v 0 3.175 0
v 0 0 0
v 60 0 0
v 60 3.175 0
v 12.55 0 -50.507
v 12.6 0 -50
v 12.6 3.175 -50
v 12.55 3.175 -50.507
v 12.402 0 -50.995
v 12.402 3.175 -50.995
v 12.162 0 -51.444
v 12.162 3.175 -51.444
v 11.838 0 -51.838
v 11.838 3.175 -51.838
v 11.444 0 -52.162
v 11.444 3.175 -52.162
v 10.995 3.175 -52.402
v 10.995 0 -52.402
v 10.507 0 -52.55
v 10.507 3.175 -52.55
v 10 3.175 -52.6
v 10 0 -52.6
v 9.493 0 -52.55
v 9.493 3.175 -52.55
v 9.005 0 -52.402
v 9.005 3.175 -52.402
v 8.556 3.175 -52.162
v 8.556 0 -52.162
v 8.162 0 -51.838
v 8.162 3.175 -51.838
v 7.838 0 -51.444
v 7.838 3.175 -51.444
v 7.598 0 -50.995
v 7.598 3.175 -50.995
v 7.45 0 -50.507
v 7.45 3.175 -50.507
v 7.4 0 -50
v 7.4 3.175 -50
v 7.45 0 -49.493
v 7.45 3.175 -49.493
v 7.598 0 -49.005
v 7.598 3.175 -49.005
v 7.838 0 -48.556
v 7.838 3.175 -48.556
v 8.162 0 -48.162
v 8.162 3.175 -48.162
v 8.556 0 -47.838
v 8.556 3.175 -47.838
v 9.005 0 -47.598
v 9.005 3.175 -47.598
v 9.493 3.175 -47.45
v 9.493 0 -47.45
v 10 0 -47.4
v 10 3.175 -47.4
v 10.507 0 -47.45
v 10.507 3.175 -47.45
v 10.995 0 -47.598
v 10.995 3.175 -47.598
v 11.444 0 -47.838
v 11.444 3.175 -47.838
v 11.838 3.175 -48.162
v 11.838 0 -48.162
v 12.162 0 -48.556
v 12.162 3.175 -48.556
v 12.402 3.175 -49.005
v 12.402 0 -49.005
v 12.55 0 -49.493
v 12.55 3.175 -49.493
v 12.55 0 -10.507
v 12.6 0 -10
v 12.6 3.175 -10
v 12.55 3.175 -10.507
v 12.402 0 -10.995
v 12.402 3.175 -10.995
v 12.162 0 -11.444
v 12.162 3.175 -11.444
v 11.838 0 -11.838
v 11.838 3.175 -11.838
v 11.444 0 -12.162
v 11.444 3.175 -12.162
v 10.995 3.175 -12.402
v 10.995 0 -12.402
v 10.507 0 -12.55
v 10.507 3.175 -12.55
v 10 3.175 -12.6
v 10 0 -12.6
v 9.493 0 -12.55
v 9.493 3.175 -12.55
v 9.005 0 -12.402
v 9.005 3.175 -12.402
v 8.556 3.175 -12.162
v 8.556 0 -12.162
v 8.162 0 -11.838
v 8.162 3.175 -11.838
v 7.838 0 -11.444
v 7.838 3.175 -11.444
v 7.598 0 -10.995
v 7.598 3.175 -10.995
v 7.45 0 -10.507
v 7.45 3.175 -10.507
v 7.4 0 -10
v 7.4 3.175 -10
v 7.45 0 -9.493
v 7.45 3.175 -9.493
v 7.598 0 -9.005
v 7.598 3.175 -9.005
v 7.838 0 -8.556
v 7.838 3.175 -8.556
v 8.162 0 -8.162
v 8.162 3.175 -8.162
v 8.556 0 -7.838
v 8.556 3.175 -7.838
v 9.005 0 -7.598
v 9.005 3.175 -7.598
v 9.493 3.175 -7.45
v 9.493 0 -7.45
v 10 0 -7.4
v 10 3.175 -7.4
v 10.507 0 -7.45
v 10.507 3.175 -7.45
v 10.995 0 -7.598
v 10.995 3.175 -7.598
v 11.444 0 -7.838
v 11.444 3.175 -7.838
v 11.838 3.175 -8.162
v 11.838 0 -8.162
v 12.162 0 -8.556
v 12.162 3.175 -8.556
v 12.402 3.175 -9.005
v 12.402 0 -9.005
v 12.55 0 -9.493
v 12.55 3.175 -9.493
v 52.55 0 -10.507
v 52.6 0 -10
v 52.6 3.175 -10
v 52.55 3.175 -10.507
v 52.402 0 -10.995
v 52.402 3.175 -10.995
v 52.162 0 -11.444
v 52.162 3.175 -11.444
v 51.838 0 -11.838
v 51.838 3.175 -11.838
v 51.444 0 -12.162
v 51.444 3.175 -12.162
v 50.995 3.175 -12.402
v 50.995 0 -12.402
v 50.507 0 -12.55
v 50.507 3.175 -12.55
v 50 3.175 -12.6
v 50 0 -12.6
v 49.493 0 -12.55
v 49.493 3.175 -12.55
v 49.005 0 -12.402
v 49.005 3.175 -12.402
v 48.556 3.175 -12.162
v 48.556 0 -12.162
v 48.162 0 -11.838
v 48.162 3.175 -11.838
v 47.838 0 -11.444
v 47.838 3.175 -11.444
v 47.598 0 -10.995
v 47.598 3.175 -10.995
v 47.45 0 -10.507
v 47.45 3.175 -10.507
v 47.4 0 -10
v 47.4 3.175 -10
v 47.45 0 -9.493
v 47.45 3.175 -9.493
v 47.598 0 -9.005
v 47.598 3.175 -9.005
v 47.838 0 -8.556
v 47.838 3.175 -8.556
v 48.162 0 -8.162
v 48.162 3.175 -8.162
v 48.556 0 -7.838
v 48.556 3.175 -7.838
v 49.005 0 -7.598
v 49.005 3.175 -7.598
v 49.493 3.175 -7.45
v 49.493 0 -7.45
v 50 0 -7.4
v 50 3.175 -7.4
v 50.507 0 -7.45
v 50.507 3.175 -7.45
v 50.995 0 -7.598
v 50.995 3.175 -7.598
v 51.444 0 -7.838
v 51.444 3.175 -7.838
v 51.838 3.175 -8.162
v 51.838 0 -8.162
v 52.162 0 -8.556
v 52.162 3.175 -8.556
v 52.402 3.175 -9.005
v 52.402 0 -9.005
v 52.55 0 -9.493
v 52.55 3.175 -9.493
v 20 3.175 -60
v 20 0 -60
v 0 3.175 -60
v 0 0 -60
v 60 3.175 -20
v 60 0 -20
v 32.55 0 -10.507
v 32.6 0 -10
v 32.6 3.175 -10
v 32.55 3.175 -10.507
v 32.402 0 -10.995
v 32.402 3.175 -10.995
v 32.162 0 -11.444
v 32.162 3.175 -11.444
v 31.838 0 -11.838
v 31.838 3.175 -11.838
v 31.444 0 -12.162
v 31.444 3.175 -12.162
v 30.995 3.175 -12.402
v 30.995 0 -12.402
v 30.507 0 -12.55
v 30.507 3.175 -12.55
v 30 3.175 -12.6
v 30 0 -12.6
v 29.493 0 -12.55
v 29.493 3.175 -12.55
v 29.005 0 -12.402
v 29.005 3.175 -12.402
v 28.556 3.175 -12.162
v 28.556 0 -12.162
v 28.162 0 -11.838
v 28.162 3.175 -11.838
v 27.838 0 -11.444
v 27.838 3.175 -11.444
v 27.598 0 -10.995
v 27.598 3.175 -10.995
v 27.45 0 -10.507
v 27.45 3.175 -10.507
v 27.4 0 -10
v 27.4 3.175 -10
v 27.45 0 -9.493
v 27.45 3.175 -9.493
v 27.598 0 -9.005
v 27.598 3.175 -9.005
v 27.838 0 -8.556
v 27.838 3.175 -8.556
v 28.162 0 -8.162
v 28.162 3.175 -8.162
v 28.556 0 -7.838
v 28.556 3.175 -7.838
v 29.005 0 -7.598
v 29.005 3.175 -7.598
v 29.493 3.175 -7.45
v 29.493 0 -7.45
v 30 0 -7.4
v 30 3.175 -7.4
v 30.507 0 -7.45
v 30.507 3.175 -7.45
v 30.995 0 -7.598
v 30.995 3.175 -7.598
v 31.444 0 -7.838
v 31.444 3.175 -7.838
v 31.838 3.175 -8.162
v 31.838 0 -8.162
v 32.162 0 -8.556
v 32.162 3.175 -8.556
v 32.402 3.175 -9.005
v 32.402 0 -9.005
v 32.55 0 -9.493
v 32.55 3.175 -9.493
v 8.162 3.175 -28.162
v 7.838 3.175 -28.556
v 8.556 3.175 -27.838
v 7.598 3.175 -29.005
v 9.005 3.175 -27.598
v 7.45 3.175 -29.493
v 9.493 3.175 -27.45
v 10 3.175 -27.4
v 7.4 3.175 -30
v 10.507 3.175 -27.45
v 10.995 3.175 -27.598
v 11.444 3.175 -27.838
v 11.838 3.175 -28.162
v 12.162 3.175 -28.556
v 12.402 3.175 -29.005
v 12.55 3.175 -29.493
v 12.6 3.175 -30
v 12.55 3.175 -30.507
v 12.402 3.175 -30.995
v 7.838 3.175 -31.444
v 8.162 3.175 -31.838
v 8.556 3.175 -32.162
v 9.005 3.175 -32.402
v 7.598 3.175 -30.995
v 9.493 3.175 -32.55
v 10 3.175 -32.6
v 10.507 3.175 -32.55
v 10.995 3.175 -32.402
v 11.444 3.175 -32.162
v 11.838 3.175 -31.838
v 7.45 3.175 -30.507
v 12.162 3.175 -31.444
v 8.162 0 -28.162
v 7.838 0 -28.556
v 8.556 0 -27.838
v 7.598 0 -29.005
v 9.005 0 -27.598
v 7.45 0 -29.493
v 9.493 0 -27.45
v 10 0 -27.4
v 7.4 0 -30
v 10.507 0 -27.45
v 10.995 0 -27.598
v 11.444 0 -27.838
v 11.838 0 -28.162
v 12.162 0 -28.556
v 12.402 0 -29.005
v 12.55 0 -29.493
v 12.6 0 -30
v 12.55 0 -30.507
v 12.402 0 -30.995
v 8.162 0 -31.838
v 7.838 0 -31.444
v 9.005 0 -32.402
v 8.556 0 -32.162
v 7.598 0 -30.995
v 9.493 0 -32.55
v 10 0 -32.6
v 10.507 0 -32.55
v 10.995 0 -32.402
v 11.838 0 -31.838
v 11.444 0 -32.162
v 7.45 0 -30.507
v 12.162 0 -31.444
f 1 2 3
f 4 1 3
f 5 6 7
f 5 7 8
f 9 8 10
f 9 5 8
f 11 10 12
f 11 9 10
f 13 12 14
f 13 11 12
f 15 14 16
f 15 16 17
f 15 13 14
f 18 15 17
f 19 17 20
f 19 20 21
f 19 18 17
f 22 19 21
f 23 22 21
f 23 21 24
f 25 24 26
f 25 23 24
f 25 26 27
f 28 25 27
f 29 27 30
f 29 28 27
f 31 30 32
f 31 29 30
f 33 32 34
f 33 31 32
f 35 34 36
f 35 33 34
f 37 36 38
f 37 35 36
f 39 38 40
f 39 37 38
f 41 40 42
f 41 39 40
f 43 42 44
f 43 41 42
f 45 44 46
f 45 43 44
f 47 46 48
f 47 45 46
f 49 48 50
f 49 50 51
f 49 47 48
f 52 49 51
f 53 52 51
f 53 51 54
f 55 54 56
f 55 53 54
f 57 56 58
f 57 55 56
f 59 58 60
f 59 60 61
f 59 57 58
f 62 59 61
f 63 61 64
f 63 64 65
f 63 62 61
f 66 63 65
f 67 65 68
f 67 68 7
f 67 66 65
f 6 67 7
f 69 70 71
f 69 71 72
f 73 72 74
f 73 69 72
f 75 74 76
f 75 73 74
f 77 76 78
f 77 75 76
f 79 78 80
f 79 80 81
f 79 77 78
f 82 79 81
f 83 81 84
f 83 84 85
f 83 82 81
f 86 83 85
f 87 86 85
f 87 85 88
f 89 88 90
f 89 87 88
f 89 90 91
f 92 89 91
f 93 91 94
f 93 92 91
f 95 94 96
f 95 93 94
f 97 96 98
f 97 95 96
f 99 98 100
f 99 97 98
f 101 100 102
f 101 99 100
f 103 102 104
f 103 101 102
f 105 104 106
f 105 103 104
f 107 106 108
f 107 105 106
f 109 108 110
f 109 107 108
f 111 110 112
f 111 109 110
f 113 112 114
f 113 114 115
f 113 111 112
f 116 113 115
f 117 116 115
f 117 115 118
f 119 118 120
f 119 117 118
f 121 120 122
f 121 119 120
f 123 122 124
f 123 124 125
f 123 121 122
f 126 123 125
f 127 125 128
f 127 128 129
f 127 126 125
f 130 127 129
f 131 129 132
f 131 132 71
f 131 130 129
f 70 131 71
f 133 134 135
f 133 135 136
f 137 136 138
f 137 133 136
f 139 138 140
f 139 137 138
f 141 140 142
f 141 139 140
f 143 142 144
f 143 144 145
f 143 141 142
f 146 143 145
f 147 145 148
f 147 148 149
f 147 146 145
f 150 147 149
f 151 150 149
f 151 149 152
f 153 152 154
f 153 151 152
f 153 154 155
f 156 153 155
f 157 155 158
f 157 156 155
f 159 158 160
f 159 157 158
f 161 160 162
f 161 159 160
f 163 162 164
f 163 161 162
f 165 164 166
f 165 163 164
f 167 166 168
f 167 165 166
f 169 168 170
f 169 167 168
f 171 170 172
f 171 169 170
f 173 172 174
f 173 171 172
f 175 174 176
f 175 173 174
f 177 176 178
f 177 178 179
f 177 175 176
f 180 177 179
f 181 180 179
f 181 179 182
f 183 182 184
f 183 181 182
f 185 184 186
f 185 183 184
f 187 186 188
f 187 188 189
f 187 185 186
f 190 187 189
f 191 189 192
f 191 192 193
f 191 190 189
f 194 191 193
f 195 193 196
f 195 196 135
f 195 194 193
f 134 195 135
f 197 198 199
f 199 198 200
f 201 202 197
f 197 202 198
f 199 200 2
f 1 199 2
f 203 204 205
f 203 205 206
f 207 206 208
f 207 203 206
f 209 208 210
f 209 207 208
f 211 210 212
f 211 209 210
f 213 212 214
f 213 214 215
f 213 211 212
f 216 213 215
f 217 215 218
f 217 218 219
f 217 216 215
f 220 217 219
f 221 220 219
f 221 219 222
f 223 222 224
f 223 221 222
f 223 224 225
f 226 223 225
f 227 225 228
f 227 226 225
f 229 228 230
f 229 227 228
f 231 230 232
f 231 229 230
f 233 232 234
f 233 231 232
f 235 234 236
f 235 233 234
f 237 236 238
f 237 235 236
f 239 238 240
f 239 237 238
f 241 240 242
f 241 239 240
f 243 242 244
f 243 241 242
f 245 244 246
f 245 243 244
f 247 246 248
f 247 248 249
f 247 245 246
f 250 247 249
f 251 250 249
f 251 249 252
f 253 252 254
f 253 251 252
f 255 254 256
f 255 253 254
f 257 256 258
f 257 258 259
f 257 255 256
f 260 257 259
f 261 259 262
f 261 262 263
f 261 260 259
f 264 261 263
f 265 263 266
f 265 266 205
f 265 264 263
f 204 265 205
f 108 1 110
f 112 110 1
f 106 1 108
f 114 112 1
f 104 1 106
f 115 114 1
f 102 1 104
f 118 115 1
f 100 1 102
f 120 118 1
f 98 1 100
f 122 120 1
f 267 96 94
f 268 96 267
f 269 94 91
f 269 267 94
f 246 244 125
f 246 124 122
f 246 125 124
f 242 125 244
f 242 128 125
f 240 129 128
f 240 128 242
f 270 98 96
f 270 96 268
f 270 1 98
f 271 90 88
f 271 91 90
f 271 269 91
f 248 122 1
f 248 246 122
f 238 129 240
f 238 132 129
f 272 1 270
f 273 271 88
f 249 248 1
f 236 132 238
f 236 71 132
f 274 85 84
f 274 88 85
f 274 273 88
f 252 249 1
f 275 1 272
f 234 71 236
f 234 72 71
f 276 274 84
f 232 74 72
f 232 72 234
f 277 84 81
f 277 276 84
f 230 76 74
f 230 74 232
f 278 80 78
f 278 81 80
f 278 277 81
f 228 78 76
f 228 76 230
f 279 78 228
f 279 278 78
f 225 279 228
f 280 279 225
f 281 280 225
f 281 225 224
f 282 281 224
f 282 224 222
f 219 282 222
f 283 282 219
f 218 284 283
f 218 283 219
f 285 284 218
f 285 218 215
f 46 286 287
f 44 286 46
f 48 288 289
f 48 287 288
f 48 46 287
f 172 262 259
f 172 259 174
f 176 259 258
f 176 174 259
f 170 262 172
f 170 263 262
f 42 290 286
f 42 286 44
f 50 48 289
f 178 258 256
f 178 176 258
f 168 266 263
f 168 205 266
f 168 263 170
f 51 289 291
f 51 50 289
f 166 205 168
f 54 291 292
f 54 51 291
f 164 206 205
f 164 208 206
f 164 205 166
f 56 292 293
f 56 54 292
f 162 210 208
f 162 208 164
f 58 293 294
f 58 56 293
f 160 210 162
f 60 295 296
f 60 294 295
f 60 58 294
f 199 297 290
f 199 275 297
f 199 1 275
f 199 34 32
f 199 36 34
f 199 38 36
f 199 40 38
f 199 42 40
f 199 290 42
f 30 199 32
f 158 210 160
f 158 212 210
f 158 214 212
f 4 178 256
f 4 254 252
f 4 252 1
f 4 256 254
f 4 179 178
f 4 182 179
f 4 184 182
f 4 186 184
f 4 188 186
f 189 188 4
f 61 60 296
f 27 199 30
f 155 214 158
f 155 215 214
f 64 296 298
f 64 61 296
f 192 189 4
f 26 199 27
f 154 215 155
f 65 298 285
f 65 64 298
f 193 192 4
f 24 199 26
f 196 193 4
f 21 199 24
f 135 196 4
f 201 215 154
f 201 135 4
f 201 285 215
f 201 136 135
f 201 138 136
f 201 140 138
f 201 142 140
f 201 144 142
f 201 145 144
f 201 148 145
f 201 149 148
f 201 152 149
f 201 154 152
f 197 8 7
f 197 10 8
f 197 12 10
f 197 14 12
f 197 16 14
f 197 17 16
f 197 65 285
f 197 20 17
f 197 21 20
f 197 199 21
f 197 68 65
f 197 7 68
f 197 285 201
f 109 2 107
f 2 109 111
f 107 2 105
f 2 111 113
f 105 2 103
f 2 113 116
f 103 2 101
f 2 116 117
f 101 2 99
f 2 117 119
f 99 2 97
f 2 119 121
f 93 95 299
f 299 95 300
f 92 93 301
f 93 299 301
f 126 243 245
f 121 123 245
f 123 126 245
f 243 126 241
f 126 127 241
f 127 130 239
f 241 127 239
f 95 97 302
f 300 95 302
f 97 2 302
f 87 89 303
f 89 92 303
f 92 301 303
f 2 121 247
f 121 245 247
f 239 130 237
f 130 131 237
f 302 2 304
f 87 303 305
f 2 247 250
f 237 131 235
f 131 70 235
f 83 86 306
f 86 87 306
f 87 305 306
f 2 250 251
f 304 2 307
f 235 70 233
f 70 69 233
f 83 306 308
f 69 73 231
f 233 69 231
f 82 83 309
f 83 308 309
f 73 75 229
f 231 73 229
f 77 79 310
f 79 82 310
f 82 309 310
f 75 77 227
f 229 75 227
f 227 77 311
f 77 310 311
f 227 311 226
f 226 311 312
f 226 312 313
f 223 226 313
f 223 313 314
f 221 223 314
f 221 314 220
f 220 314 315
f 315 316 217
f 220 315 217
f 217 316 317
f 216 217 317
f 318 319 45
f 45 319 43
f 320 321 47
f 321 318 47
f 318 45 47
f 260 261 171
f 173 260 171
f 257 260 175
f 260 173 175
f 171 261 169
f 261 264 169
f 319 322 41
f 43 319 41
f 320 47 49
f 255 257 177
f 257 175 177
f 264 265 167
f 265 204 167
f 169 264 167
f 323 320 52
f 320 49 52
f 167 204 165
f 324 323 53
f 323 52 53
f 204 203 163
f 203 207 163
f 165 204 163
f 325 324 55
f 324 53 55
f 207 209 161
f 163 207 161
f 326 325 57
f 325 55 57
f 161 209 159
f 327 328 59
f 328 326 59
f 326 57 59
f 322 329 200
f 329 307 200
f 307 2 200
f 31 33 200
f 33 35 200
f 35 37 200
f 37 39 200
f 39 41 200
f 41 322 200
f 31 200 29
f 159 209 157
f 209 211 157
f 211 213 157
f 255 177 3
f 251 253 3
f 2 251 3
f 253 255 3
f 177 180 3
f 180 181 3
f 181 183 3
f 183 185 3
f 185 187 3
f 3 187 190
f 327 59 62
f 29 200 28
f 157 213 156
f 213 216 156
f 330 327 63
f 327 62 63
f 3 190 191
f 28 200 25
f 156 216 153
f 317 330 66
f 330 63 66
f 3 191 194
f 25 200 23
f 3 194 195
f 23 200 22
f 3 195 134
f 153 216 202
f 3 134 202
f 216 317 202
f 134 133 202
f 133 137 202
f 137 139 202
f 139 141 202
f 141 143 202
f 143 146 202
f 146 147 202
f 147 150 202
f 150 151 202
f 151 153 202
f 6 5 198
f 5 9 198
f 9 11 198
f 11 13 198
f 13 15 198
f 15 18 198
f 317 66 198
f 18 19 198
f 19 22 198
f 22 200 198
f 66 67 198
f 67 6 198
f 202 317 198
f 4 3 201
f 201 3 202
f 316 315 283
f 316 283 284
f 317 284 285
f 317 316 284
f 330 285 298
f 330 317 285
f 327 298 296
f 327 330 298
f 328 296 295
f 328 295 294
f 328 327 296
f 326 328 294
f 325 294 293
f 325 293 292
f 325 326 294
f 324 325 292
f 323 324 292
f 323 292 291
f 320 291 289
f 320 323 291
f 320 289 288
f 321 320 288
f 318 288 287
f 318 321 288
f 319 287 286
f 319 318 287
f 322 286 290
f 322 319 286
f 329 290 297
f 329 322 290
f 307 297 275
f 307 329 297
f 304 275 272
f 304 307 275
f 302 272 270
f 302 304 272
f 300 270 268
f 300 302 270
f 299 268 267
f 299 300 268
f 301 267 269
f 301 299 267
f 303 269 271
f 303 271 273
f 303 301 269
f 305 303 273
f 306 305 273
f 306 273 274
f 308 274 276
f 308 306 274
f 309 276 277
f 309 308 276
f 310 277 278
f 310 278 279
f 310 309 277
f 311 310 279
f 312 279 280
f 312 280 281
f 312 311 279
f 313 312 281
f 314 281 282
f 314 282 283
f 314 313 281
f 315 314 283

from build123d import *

# Parameters (mm, degrees)
SKETCH1_R           = 2.6
BOSS_EXTRUDE1_DEPTH = 3.175


with BuildPart() as part:
    # Sketch1 → Boss-Extrude1 (new body)
    with BuildSketch(Plane(origin=(0, 0, 0), x_dir=(1, 0, 0), z_dir=(0, 1, 0))):
        Polygon((60, 0), (60, 20), (20, 60), (0, 60), (0, 0), align=None)
        with Locations((50, 10)):
            Circle(SKETCH1_R, mode=Mode.SUBTRACT)
        with Locations((10, 50)):
            Circle(SKETCH1_R, mode=Mode.SUBTRACT)
        with Locations((30, 10)):
            Circle(SKETCH1_R, mode=Mode.SUBTRACT)
        with Locations((10, 10)):
            Circle(SKETCH1_R, mode=Mode.SUBTRACT)
        with Locations((10, 30)):
            Circle(SKETCH1_R, mode=Mode.SUBTRACT)
    extrude(amount=BOSS_EXTRUDE1_DEPTH)


solid = part.part
